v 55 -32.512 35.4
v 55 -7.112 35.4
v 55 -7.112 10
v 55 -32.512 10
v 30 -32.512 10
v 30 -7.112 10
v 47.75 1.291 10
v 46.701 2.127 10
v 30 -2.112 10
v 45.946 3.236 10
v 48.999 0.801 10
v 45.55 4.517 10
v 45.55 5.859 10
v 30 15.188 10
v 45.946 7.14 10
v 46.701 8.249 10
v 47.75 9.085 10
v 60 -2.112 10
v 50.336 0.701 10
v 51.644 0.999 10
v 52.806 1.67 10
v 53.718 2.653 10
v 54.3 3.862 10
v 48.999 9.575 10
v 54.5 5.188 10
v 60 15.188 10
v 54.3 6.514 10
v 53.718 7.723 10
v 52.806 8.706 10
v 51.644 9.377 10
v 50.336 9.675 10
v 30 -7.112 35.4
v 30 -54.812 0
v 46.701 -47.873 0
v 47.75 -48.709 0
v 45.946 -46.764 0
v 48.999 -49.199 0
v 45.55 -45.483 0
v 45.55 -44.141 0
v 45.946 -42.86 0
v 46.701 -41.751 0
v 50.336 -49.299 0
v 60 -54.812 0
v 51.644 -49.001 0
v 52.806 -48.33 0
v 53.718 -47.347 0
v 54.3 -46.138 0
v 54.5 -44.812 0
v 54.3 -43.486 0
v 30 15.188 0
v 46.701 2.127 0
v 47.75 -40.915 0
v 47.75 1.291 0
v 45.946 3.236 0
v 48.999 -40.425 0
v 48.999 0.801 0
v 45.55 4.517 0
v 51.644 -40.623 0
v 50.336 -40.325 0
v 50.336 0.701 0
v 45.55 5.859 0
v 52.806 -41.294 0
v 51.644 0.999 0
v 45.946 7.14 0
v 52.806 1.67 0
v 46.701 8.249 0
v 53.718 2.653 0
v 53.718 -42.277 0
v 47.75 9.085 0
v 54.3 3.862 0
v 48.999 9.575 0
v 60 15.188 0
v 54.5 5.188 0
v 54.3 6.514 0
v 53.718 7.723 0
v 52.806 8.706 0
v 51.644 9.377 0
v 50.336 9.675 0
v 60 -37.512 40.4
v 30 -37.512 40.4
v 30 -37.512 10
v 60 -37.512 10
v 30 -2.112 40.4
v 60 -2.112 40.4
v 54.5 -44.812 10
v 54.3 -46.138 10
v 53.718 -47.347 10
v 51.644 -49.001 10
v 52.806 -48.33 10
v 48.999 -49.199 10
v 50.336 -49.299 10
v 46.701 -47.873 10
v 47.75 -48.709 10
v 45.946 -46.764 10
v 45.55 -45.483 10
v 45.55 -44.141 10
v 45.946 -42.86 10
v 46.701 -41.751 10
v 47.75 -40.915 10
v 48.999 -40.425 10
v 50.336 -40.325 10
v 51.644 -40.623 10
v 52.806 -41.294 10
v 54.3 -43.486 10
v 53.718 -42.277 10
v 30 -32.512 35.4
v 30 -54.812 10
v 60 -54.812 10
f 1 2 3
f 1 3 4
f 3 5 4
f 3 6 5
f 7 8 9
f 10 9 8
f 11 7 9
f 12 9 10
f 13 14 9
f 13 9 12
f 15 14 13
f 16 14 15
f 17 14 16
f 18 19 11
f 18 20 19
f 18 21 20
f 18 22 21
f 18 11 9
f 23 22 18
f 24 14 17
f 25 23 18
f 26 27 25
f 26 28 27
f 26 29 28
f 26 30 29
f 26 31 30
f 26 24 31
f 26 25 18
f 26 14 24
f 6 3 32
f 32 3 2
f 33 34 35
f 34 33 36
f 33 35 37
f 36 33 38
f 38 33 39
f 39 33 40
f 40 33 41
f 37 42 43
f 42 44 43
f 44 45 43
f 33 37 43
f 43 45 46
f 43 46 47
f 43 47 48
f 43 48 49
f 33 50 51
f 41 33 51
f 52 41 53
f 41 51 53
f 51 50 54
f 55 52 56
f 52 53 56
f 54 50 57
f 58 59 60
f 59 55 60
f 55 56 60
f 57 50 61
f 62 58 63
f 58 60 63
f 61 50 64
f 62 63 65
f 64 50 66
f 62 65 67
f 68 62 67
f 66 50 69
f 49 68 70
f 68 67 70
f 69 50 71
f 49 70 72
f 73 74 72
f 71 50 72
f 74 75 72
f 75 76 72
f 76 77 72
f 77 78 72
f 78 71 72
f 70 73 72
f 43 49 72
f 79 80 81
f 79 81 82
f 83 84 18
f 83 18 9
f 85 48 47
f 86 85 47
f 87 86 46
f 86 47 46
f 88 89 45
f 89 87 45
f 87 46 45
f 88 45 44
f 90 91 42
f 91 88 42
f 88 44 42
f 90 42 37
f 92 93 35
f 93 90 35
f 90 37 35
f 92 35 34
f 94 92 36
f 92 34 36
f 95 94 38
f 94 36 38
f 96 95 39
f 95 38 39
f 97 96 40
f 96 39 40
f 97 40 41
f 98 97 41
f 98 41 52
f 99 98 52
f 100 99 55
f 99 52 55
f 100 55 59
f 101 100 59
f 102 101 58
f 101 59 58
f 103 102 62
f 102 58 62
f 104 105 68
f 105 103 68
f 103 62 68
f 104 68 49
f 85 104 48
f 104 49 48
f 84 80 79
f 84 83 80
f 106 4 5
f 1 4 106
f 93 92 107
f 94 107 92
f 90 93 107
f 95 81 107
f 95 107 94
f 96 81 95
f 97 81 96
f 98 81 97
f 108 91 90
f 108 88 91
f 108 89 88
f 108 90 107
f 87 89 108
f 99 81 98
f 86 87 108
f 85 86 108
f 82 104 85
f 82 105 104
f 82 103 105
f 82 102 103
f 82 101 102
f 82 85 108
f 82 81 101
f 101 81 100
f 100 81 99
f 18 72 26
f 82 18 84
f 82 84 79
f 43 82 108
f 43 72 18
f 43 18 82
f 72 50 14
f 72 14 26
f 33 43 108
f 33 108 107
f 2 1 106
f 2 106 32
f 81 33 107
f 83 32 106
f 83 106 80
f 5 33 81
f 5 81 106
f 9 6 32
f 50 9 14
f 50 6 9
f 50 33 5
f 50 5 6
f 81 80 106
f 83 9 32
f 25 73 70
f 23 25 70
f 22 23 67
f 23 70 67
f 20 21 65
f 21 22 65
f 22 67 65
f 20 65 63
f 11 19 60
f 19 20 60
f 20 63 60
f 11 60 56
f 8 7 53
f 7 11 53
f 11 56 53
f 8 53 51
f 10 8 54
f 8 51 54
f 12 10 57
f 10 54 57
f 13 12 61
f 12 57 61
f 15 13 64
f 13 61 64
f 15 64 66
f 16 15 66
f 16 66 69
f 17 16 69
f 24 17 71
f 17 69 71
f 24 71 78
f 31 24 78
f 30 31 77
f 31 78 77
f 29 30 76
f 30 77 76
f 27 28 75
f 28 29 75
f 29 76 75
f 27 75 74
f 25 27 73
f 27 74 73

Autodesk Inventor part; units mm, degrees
ref_plane "YZ Plane" through (0, 0, 0) normal (1, 0, 0) x (0, 1, 0)
ref_plane "XZ Plane" through (0, 0, 0) normal (0, 1, 0) x (-1, 0, 0)
ref_plane "XY Plane" through (0, 0, 0) normal (0, 0, 1) x (1, 0, 0)
sketch "Sketch1" plane through (0, 0, 0) normal (0, 0, 1) x (1, 0, 0)
  circle A0 centre (-50, 5.188) radius 4.5 projected
  circle A1 centre (-50, -44.812) radius 4.5 projected
  circle A2 centre (50, 5.188) radius 4.5 projected
  circle A3 centre (50, -44.812) radius 4.5 projected
  line L0 (30, 15.188) -> (60, 15.188)
  line L1 (60, 15.188) -> (60, -54.812)
  line L2 (60, -54.812) -> (30, -54.812)
  line L3 (30, -54.812) -> (30, 15.188)
  circle A4 centre (50, 5.188) radius 4
  circle A5 centre (50, -44.812) radius 4
  point P0 (0, 0)
  dimension "d1" = 30
  dimension "d2" = 60
  dimension "d28" = 10
  dimension "d29" = 10
extrude "Extrusion1" add sketch "Sketch1" along normal blind 10 contours L0 L1 L2 L3
sketch "Sketch2" plane through (0, 0, 10) normal (0, 0, 1) x (1, 0, 0)
  line L0 (60, -2.112) -> (55, -2.112)
  line L1 (55, -2.112) -> (55, -37.512)
  line L2 (55, -37.512) -> (60, -37.512)
  line L3 (60, -37.512) -> (60, -2.112)
  line L4 (60, 15.188) -> (30, 15.188) projected
  line L5 (30, -54.812) -> (60, -54.812) projected
  line L6 (60, -54.812) -> (60, 15.188) projected
  point P0 (0, 0)
  dimension "d7" = 5
  dimension "d26" = 35.4
  dimension "d27" = 17.3
extrude "Extrusion2" add sketch "Sketch2" along normal blind 30.4
sketch "Sketch3" plane through (55, -37.512, 10) normal (-1, 0, 0) x (0, 0, 1)
  line L0 (30.4, 35.4) -> (0, 35.4)
  line L1 (0, 35.4) -> (0, 30.4)
  line L2 (0, 30.4) -> (30.4, 30.4)
  line L3 (30.4, 30.4) -> (30.4, 35.4)
  line L4 (30.4, 5) -> (25.4, 5)
  line L5 (25.4, 5) -> (25.4, 30.4)
  line L6 (25.4, 30.4) -> (30.4, 30.4)
  line L7 (30.4, 30.4) -> (30.4, 5)
  line L8 (30.4, 0) -> (0, 0)
  line L9 (0, 0) -> (0, 5)
  line L10 (0, 5) -> (30.4, 5)
  line L11 (30.4, 5) -> (30.4, 0)
  line L12 (0, 52.7) -> (0, -17.3) projected
  line L13 (30.4, 35.4) -> (30.4, 0) projected
  line L14 (0, 35.4) -> (30.4, 35.4) projected
  dimension "d21" = 25.4
  dimension "d22" = 25.4
  dimension "d23" = 5
  dimension "d24" = 5
extrude "Extrusion3" add sketch "Sketch3" along normal up to surface (25 mm away) contours L3 L2 L1 L0 | L7 L4 L5 L2 | L11 L8 L9 L10 L4
properties part number "RailMount" material "PC/ABS Plastic"
